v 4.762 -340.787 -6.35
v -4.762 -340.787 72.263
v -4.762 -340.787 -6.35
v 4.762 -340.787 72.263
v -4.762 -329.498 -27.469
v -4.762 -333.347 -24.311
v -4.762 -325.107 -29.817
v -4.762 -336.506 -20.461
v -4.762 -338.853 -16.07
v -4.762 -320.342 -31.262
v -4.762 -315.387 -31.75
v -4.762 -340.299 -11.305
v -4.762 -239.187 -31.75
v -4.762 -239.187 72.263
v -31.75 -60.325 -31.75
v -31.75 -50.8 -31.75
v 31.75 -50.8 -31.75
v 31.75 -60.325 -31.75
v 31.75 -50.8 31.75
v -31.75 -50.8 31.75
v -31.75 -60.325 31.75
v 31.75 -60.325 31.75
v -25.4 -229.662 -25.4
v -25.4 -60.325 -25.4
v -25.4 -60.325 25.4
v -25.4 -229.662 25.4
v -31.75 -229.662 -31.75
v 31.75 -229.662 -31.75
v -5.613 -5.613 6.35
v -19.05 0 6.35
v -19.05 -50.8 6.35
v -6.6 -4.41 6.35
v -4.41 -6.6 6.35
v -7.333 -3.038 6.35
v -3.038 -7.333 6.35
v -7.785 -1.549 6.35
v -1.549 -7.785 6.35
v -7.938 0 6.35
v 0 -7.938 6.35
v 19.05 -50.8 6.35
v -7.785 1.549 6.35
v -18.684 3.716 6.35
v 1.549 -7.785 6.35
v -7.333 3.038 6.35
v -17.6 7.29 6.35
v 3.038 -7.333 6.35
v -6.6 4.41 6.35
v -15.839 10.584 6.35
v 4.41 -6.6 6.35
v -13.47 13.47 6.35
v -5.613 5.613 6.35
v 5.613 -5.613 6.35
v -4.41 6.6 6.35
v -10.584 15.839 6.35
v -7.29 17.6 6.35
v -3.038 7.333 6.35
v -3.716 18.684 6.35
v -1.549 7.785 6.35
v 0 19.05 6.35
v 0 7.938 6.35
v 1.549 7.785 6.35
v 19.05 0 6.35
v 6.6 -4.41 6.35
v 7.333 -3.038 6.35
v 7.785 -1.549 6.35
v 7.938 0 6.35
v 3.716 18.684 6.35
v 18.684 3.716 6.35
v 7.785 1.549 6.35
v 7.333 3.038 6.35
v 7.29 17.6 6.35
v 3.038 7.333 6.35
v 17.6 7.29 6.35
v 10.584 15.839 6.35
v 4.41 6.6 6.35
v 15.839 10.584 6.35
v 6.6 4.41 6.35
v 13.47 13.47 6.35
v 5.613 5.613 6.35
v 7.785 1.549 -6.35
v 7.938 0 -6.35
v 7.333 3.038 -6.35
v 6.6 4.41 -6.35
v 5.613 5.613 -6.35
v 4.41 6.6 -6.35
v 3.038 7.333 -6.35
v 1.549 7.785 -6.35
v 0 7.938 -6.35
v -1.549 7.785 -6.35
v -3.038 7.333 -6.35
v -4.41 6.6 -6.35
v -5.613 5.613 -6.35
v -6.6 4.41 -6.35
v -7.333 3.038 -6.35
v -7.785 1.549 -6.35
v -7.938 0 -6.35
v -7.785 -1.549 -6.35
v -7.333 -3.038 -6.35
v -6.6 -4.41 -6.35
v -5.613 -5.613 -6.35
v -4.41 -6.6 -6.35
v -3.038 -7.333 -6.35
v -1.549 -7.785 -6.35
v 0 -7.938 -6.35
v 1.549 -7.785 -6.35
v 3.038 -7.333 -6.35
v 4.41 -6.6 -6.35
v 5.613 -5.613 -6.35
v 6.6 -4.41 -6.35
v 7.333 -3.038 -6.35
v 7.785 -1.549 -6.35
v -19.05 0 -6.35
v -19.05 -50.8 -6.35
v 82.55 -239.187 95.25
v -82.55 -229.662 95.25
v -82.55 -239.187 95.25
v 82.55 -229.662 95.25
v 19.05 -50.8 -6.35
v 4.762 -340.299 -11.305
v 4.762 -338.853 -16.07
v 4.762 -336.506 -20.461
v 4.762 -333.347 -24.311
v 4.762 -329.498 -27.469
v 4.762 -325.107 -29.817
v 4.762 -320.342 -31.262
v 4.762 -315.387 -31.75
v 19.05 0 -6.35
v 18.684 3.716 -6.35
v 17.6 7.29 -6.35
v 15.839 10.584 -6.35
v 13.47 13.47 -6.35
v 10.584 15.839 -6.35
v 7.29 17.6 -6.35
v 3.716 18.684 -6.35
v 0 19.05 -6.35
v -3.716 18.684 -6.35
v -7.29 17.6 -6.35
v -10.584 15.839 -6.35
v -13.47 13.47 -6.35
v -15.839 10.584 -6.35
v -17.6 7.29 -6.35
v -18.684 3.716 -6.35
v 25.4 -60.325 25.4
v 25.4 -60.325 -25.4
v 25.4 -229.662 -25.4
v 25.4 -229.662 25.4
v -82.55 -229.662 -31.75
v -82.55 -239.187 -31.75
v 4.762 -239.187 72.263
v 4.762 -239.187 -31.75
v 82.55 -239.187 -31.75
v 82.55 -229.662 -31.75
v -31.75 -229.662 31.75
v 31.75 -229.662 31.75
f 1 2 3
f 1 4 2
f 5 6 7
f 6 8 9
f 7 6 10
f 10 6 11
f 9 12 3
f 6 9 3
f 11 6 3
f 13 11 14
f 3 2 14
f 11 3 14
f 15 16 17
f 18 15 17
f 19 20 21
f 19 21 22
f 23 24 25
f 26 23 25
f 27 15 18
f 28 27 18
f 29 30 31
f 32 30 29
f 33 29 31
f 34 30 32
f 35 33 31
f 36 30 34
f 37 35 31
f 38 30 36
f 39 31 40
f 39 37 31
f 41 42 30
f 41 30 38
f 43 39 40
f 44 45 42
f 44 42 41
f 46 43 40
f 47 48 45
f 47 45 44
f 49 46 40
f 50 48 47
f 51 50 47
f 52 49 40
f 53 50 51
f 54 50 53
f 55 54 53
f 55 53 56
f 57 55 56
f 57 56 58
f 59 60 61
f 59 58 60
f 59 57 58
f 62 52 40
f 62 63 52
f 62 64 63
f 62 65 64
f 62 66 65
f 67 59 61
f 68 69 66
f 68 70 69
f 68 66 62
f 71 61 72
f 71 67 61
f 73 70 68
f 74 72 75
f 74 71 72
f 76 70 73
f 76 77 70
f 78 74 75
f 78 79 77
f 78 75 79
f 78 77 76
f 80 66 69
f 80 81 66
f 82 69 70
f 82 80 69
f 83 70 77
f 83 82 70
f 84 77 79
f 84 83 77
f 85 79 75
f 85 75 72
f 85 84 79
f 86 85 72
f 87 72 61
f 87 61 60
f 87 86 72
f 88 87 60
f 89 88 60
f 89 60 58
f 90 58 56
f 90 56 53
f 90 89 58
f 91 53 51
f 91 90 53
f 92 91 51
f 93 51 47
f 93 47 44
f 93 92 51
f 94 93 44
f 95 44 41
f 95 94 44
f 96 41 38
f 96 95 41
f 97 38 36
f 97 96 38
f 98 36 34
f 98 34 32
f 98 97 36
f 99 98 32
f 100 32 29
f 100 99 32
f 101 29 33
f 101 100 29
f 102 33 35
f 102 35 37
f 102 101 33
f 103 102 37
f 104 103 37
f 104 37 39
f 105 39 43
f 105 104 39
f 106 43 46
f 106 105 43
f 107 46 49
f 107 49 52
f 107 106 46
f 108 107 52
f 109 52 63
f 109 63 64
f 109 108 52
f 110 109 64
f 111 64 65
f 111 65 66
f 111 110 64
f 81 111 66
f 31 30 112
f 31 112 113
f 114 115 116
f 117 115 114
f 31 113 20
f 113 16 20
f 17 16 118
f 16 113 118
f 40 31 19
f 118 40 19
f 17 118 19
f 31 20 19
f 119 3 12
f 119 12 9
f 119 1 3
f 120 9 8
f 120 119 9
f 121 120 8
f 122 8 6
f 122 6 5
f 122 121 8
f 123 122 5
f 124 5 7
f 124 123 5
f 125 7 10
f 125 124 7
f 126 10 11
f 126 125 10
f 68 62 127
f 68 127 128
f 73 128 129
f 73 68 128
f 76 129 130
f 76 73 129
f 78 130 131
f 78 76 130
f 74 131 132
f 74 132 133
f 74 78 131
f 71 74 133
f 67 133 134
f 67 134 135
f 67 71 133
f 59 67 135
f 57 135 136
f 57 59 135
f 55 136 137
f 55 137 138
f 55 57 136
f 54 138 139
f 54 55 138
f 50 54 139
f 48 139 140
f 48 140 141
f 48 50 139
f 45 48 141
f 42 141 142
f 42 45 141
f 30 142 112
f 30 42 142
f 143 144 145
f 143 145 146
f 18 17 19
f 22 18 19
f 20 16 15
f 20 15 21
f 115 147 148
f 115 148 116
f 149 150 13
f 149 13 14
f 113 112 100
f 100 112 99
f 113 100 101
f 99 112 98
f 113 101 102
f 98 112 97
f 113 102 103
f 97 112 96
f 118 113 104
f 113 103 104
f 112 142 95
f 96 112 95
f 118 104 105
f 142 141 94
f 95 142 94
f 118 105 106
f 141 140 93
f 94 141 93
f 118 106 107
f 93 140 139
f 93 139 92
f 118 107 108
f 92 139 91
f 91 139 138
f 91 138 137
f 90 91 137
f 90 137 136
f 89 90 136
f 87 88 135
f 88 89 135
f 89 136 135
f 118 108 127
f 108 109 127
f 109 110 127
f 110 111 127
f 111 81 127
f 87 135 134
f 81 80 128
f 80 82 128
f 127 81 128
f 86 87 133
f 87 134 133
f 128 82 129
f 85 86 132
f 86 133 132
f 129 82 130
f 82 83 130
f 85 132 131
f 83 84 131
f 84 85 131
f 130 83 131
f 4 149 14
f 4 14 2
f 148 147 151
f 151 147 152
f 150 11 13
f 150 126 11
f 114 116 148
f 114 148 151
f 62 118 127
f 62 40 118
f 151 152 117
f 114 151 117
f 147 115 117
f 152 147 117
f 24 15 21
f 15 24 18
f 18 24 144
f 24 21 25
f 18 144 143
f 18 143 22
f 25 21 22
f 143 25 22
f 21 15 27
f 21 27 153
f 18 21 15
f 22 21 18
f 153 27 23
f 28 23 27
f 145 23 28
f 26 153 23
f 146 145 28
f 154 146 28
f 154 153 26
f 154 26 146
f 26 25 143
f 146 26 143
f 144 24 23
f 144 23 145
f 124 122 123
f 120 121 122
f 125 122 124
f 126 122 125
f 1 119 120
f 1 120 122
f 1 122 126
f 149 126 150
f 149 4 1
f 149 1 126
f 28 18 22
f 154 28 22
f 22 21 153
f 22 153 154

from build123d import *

# Parameters (mm, degrees)
F0_R          = 7.9375
F1_DEPTH      = 6.35
F1_DEPTH_BACK = 6.35
F2_W          = 63.5
F2_H          = 63.5
F3_DEPTH      = 9.525
F4_W          = 63.5
F4_H          = 63.5
F4_W_2        = 50.8
F4_H_2        = 50.8
F5_DEPTH      = 169.3366438
F6_W          = 165.1
F6_H          = 127
F7_DEPTH      = 9.525
F9_DEPTH      = 4.7625
F9_DEPTH_BACK = 4.7625


with BuildPart() as f1:
    # F0 (on Top) → F1 (new body, two sides)
    with BuildSketch(Plane.XY) as f1_sk:
        with BuildLine():
            Line((19.05, -50.8), (19.05, 0))
            ThreePointArc((19.05, 0), (0, 19.05), (-19.05, 0))
            Line((-19.05, 0), (-19.05, -50.8))
            Line((-19.05, -50.8), (19.05, -50.8))
        make_face()
        Circle(F0_R, mode=Mode.SUBTRACT)
    extrude(amount=F1_DEPTH)
    extrude(f1_sk.sketch, amount=-F1_DEPTH_BACK)

    # F2 (on face) → F3 (join)
    with BuildSketch(Plane.XZ.offset(50.8)):
        Rectangle(F2_W, F2_H)
    extrude(amount=F3_DEPTH)


with BuildPart() as f5:
    # F4 (on face) → F5 (new body)
    with BuildSketch(Plane.XZ.offset(60.325)):
        Rectangle(F4_W, F4_H)
        Rectangle(F4_W_2, F4_H_2, mode=Mode.SUBTRACT)
    extrude(amount=F5_DEPTH)


with BuildPart() as f7:
    # F6 (on face) → F7 (new body)
    with BuildSketch(Plane.XZ.offset(229.6616438)):
        with Locations((0, 31.75)):
            Rectangle(F6_W, F6_H)
    extrude(amount=F7_DEPTH)


with BuildPart() as f9:
    # F8 (on Right) → F9 (new body, two sides)
    with BuildSketch(Plane.YZ) as f9_sk:
        with BuildLine():
            Line((-315.3866438, -31.75), (-239.1866438, -31.75))
            Line((-239.1866438, -31.75), (-239.1866438, 72.2632286))
            Line((-239.1866438, 72.2632286), (-340.7866438, 72.2632286))
            Line((-340.7866438, 72.2632286), (-340.7866438, -6.35))
            ThreePointArc((-340.7866438, -6.35), (-333.3471560421, -24.3105122421), (-315.3866438, -31.75))
        make_face()
    extrude(amount=F9_DEPTH)
    extrude(f9_sk.sketch, amount=-F9_DEPTH_BACK)


solid = Compound([f1.part, f5.part, f7.part, f9.part])
